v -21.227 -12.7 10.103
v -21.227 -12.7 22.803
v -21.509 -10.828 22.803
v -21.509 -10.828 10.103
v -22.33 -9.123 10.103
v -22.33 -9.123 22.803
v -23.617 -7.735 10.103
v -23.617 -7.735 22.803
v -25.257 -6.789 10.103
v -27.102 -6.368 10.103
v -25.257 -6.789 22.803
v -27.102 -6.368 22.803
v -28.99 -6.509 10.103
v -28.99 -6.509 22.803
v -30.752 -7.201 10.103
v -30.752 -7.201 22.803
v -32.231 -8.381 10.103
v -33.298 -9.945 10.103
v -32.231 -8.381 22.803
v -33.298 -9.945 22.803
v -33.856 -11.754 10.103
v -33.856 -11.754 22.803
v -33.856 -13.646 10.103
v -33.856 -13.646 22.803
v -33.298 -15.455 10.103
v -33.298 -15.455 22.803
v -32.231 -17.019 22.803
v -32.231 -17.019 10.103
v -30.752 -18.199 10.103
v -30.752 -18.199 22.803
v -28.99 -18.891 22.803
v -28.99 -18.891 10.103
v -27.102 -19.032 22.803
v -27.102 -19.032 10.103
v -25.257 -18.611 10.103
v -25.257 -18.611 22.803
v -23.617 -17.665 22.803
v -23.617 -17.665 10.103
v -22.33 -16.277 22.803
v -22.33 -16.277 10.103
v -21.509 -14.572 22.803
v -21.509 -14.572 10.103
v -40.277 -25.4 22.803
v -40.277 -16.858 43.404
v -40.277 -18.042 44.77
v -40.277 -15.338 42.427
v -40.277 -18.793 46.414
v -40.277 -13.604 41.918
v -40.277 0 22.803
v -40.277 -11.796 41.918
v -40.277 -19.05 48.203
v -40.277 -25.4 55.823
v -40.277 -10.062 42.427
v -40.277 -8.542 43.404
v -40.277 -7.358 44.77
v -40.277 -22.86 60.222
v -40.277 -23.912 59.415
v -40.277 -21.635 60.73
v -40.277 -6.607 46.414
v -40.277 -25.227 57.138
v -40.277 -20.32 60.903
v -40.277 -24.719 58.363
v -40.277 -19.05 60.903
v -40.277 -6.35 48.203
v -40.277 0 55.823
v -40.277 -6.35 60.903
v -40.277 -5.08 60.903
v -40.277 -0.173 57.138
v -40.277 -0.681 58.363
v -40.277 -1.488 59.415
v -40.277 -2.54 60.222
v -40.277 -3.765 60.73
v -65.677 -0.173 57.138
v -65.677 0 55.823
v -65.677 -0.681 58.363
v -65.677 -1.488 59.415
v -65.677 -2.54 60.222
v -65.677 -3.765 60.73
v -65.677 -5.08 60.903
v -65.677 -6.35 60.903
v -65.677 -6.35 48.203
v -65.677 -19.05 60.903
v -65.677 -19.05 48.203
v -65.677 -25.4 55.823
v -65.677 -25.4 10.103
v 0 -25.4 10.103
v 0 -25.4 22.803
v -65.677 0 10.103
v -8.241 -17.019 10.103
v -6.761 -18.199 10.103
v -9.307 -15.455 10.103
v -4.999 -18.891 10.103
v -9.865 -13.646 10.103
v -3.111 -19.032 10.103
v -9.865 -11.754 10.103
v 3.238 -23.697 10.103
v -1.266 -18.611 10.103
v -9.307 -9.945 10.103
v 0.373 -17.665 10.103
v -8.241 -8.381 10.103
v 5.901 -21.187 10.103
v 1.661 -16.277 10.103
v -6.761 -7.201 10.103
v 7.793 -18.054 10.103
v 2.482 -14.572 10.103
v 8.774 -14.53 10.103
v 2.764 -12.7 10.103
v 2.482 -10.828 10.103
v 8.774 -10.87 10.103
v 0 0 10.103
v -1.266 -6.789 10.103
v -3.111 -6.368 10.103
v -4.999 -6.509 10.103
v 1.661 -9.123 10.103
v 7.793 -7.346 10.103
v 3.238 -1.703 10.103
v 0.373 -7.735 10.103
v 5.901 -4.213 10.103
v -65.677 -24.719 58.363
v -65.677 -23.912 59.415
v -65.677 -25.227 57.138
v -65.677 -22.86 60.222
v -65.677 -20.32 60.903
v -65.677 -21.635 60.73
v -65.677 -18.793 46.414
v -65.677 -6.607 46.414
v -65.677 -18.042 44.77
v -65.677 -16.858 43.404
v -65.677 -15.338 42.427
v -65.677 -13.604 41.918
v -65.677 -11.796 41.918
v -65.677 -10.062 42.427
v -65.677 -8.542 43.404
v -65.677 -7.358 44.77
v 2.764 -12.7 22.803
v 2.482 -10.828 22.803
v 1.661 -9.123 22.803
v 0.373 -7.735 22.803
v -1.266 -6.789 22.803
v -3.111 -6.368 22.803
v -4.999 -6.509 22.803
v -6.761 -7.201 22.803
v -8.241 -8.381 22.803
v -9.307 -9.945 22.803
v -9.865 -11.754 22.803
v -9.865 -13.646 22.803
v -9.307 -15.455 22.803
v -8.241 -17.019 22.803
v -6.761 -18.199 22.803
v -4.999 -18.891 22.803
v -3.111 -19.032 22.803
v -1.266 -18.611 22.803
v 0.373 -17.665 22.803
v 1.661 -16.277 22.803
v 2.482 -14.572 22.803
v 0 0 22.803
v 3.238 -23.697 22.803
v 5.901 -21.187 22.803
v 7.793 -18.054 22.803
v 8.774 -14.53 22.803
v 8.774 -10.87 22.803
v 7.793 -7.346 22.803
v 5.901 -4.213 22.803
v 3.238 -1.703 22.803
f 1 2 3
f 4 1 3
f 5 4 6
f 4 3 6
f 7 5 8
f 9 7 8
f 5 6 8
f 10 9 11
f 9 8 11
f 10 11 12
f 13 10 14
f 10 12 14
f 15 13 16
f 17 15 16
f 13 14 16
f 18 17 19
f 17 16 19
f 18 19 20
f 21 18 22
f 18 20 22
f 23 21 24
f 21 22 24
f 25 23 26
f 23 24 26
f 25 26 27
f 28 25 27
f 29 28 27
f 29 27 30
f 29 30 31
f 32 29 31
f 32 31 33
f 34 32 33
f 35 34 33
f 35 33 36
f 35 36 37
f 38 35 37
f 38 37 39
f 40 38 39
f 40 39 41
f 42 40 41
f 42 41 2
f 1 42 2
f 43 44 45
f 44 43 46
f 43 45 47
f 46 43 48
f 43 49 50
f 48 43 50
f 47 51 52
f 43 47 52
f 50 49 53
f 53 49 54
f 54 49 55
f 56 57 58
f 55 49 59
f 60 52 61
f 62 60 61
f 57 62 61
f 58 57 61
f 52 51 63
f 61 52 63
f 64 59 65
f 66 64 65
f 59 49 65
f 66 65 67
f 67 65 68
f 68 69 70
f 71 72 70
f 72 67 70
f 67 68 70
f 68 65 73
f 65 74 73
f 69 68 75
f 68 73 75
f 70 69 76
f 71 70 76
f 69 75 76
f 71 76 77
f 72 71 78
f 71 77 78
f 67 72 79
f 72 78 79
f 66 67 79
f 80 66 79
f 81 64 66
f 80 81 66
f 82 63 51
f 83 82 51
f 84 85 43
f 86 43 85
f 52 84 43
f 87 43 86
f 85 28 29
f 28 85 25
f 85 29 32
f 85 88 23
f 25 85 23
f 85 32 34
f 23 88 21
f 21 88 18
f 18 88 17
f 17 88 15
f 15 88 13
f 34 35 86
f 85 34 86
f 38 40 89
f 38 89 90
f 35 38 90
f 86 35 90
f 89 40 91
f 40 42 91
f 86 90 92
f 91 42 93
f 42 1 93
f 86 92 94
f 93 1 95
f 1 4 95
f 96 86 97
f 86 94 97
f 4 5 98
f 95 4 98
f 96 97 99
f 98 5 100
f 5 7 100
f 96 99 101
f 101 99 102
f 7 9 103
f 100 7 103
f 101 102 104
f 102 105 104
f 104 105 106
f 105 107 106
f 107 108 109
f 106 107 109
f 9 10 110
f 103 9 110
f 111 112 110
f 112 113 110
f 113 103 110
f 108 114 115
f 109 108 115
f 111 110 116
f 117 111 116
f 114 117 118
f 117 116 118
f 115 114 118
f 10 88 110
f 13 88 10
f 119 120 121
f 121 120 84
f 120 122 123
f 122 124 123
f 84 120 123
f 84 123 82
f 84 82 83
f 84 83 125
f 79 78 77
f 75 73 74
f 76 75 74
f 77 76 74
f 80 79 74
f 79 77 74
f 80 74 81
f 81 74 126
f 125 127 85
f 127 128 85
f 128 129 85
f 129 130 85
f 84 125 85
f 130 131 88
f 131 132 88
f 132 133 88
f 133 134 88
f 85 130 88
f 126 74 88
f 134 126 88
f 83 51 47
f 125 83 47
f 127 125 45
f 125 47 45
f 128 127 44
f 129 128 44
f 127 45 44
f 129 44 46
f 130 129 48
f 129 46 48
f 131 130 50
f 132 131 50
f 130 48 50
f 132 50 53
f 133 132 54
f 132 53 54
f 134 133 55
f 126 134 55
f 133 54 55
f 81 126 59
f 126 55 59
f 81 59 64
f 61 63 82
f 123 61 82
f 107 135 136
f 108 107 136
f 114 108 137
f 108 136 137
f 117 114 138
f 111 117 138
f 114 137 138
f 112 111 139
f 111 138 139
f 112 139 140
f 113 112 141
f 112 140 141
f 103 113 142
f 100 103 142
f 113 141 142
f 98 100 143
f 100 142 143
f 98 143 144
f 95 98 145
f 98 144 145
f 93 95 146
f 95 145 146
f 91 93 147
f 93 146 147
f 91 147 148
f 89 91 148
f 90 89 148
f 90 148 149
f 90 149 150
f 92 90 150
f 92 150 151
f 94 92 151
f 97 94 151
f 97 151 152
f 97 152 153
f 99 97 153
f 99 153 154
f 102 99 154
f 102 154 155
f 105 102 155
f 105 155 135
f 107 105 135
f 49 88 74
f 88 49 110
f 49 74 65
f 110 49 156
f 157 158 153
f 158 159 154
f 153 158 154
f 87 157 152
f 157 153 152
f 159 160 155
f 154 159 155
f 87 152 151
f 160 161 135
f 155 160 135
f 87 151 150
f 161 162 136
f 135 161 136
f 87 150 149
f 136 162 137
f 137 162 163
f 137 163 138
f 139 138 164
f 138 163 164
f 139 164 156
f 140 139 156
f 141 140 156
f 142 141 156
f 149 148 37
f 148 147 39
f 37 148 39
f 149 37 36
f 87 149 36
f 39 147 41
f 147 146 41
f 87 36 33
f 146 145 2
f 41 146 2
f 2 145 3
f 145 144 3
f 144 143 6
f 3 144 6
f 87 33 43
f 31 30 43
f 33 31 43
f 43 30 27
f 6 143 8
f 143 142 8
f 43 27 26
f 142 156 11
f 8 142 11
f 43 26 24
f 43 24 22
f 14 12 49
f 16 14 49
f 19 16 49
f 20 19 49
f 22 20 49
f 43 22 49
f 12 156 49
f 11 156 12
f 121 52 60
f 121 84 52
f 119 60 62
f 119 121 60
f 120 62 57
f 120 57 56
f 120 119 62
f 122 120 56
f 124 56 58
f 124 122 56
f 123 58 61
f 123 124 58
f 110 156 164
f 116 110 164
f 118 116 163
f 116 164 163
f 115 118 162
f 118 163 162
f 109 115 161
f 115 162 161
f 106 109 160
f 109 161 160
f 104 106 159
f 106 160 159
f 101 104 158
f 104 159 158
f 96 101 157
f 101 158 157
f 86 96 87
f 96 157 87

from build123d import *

# Parameters (mm, degrees)
F1_DEPTH = 25.4
F2_R     = 6.35
F3_DEPTH = 12.701
F5_DEPTH = 25.401
F6_R     = 5.08
F7_R     = 5.08


with BuildPart() as f1:
    # F0 (on Front) → F1 (new body)
    with BuildSketch(Plane.XZ):
        Polygon((-40.276536, 60.90298), (-65.676536, 60.90298), (-65.676536, 10.10298), (9.114186, 10.10298), (9.114186, 22.80298), (-40.276536, 22.80298), align=None)
    extrude(amount=F1_DEPTH)

    # F2 (on face) → F3 (cut, through all)
    with BuildSketch(Plane.XY.offset(22.80298)):
        with Locations((-27.576536, -12.7)):
            Circle(F2_R)
        with Locations((-3.585814, -12.7)):
            Circle(F2_R)
        with BuildLine():
            ThreePointArc((0, 0), (8.89883, -12.7), (0, -25.4))
            Line((0, -25.4), (9.114186, -25.4))
            Line((9.114186, -25.4), (9.114186, 0))
            Line((9.114186, 0), (0, 0))
        make_face()
    extrude(amount=-F3_DEPTH, mode=Mode.SUBTRACT)

    # F4 (on face) → F5 (cut, through all)
    with BuildSketch(Plane.YZ.offset(-40.276536)):
        with BuildLine():
            ThreePointArc((-19.05, 48.20298), (-12.7, 41.85298), (-6.35, 48.20298))
            ThreePointArc((-6.35, 48.20298), (-12.7, 54.55298), (-19.05, 48.20298))
        make_face()
        with BuildLine():
            ThreePointArc((-19.05, 48.20298), (-12.7, 54.55298), (-6.35, 48.20298))
            Line((-6.35, 48.20298), (-6.35, 60.90298))
            Line((-6.35, 60.90298), (-19.05, 60.90298))
            Line((-19.05, 60.90298), (-19.05, 48.20298))
        make_face()
    extrude(amount=-F5_DEPTH, mode=Mode.SUBTRACT)

    # F6
    f6_edges = [f1.edges().sort_by_distance(p)[0] for p in [
        (-52.976536, -25.4, 60.90298),
    ]]
    fillet(f6_edges, radius=F6_R)

    # F7
    f7_edges = [f1.edges().sort_by_distance(p)[0] for p in [
        (-52.976536, 0, 60.90298),
    ]]
    fillet(f7_edges, radius=F7_R)


solid = f1.part
